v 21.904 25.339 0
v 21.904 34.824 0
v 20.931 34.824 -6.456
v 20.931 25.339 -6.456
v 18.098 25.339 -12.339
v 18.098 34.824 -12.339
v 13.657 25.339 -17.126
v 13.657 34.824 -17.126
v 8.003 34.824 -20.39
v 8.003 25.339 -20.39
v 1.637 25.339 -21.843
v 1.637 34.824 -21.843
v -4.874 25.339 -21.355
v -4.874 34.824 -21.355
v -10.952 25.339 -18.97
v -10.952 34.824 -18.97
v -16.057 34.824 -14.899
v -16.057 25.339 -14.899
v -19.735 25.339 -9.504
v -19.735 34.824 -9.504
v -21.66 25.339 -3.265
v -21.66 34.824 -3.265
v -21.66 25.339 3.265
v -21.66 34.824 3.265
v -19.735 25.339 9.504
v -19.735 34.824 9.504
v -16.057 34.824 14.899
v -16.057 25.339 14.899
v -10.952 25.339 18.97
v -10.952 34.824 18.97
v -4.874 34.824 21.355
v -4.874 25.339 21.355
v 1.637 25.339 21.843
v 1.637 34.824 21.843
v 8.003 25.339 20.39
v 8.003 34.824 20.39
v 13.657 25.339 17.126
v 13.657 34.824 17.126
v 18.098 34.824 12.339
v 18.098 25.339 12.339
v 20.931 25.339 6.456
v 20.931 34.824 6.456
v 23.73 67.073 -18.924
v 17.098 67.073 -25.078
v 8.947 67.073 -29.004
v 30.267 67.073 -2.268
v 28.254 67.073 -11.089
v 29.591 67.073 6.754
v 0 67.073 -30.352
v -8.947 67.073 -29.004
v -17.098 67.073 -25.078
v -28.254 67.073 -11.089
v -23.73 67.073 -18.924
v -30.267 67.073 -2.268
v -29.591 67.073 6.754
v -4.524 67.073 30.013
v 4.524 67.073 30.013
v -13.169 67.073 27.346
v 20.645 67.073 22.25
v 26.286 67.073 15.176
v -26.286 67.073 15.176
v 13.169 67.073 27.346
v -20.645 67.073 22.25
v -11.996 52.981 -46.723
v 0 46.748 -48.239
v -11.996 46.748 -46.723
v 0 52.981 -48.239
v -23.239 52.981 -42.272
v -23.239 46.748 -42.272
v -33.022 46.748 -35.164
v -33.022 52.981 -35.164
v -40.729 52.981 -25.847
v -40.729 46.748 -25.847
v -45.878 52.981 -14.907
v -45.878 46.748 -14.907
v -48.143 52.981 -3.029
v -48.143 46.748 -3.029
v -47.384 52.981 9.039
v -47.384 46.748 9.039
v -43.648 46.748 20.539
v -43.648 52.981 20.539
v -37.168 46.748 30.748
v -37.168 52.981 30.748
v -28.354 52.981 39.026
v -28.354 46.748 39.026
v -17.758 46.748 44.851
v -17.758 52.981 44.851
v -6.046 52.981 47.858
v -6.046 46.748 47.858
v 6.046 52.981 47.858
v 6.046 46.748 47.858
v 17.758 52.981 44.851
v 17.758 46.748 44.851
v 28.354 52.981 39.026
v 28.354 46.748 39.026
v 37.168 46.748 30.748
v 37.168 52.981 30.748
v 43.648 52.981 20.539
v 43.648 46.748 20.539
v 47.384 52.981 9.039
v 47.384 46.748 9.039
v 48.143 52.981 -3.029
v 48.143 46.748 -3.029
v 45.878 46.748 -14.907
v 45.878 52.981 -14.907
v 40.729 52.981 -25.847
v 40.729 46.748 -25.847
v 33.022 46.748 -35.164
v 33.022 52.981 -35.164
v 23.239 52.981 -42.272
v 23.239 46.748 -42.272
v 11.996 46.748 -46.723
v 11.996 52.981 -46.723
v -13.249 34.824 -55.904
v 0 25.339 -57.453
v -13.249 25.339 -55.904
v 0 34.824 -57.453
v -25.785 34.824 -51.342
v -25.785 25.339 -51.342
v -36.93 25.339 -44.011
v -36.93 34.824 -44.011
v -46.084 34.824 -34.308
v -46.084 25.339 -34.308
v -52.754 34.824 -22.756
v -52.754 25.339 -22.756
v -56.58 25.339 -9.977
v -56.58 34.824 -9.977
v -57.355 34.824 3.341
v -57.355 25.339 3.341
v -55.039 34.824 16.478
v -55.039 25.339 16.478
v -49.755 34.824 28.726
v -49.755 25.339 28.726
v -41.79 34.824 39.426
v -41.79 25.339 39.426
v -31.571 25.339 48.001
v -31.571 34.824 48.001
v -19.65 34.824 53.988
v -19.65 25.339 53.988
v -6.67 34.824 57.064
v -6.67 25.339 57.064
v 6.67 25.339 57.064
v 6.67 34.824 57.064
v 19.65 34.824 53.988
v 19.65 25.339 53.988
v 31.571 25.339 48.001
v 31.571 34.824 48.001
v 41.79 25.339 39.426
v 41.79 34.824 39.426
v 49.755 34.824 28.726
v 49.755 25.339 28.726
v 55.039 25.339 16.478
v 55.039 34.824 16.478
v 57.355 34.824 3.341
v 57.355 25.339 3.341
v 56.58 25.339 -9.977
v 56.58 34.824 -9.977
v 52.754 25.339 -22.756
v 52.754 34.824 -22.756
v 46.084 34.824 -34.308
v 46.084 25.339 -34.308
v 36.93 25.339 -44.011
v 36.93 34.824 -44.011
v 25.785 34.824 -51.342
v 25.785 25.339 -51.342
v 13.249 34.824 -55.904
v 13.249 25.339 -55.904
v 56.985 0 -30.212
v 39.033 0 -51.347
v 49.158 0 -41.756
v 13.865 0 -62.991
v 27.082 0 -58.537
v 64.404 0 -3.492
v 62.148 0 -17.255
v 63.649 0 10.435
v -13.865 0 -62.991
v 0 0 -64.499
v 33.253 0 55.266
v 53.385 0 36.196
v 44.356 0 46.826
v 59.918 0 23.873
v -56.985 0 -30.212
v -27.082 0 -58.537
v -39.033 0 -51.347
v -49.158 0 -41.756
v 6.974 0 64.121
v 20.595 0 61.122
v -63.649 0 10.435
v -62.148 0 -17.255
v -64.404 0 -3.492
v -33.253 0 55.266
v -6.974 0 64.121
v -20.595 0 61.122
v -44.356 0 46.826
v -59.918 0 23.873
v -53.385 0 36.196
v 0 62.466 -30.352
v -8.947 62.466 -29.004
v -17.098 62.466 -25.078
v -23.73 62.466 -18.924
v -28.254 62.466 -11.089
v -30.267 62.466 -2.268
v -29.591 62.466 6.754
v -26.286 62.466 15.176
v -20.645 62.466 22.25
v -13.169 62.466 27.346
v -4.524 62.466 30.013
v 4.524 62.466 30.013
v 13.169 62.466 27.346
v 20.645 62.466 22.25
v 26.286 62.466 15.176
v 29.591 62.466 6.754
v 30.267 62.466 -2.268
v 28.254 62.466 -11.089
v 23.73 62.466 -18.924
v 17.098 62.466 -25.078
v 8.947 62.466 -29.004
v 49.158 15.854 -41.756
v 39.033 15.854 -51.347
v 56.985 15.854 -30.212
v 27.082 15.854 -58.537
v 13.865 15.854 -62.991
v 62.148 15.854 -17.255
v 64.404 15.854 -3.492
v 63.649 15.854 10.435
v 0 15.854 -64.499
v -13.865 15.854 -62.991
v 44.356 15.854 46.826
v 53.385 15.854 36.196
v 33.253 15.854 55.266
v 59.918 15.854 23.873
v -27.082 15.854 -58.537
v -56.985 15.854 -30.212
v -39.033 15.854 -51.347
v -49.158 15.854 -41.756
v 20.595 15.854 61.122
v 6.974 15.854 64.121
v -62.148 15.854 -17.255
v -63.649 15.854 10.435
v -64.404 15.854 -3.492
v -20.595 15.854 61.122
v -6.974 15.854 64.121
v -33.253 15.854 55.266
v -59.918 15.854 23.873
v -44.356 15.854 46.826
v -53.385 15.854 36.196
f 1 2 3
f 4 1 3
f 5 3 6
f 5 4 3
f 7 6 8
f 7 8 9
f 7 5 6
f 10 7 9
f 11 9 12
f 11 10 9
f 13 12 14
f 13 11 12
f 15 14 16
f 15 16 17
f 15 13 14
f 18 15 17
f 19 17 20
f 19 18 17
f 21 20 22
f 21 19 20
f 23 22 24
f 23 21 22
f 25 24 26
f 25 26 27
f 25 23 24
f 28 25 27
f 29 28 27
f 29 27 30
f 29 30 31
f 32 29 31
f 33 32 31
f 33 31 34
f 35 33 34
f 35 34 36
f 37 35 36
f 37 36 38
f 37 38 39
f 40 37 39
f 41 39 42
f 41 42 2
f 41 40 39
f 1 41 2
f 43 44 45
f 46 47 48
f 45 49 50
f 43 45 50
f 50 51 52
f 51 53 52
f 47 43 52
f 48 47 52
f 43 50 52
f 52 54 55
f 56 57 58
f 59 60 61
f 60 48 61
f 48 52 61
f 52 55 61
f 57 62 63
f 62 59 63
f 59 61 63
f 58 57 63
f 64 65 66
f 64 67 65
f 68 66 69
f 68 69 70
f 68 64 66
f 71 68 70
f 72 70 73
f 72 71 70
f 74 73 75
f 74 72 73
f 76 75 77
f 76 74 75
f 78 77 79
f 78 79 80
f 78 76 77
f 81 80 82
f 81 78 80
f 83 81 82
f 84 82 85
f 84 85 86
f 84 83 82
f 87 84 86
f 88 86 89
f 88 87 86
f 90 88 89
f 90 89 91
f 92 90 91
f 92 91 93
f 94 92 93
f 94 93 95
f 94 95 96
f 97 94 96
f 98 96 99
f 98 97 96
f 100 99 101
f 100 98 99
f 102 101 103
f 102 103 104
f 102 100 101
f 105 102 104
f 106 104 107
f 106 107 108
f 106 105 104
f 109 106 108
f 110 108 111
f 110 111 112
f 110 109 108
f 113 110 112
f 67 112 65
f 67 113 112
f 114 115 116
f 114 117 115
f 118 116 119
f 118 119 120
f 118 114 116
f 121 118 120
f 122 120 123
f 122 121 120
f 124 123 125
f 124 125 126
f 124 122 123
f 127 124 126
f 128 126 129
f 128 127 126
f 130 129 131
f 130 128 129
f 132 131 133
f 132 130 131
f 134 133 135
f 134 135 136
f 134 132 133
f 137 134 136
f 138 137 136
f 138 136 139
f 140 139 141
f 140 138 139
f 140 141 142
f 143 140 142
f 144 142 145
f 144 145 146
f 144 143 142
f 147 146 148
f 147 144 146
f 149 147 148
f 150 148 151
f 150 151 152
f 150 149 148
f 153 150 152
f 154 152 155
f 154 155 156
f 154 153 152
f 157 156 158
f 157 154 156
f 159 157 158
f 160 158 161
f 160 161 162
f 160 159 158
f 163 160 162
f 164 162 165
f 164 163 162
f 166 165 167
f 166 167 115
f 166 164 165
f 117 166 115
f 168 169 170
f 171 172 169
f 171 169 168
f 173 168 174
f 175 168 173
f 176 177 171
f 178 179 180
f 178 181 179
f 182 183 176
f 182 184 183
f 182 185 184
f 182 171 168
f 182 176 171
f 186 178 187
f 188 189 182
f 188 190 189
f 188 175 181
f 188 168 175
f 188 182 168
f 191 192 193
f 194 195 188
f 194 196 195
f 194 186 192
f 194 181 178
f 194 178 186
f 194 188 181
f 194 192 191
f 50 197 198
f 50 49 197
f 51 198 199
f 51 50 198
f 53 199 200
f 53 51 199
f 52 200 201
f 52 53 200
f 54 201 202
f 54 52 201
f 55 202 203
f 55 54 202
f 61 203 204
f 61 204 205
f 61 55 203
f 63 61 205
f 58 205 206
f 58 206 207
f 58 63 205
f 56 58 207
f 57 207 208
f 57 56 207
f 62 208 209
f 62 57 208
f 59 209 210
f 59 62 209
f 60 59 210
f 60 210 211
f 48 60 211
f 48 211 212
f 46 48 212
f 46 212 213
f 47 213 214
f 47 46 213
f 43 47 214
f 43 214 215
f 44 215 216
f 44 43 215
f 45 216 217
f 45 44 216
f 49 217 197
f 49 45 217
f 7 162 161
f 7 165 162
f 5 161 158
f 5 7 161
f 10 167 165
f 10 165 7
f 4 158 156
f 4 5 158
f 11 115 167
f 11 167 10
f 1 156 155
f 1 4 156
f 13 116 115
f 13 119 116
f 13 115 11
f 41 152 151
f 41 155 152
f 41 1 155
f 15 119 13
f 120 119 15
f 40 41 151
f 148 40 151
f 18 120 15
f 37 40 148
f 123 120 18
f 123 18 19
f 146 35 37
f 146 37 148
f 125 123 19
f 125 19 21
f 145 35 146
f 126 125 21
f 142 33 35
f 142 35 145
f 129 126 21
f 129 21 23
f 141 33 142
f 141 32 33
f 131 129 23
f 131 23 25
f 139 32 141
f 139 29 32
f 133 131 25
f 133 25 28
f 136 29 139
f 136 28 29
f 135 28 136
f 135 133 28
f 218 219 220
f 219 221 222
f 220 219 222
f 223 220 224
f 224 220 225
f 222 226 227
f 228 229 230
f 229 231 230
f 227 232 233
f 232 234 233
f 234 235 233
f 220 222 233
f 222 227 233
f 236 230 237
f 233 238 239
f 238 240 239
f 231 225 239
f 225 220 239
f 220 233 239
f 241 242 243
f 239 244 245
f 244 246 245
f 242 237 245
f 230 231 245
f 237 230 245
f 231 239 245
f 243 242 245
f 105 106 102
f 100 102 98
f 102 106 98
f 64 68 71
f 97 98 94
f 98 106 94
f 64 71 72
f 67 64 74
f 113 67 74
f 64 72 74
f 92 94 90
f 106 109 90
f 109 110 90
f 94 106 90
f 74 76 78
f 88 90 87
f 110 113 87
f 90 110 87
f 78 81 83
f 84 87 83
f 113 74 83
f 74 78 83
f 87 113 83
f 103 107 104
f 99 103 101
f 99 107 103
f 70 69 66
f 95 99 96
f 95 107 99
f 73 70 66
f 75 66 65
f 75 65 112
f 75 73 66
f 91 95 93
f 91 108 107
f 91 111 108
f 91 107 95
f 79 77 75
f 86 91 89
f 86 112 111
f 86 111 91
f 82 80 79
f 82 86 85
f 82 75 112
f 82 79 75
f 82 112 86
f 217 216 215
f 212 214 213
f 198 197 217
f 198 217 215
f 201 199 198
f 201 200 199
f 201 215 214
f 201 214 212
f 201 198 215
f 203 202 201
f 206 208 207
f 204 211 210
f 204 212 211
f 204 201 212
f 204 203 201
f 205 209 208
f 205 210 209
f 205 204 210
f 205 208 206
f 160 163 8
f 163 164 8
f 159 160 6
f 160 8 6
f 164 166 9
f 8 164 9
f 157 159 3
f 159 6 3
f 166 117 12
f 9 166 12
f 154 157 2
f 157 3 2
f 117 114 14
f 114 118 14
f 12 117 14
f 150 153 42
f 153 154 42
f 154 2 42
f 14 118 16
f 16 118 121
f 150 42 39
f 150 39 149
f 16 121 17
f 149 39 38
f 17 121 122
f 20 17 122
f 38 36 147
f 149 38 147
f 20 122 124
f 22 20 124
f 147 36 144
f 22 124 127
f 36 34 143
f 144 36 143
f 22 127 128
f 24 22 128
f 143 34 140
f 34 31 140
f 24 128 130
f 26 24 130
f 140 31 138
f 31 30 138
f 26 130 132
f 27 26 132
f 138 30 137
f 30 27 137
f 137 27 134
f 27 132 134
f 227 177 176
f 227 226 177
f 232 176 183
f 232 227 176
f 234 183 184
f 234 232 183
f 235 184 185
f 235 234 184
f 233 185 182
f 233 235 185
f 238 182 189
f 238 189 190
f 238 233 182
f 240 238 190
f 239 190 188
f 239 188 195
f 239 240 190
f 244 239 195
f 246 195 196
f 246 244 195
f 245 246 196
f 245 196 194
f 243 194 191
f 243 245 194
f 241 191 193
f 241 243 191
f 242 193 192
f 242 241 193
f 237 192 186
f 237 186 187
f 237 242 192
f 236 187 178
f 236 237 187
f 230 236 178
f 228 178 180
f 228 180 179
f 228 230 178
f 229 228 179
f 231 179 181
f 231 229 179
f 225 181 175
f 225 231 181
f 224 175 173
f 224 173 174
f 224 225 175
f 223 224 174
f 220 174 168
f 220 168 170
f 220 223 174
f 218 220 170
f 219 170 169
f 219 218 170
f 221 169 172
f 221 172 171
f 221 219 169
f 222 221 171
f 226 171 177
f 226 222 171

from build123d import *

# Parameters (mm, degrees)
SKETCH1_W              = 64.498680347
SKETCH1_H              = 15.853667228
SKETCH1_W_2            = 57.452606024
SKETCH1_H_2            = 9.485100051
SKETCH1_W_3            = 48.238508831
SKETCH1_H_3            = 6.233065748
SKETCH1_W_4            = 30.352320163
SKETCH1_H_4            = 4.607048596
CUT_EXTRUDE1_START     = -41.734440225
CUT_EXTRUDE1_OUTLINE_R = 21.904394949
CUT_EXTRUDE1_DEPTH     = 9.485100051


# Read off the part's stored shape, not the designer's step: Cut-Extrude1
with BuildPart() as part:
    # Sketch1 → Revolve1 (revolve)
    with BuildSketch(Plane.XY, mode=Mode.PRIVATE) as revolve1_sk:
        with Locations((32.249340174, 7.926833614)):
            Rectangle(SKETCH1_W, SKETCH1_H)
        with Locations((28.726303012, 30.081317305)):
            Rectangle(SKETCH1_W_2, SKETCH1_H_2)
        with Locations((24.119254416, 49.864525983)):
            Rectangle(SKETCH1_W_3, SKETCH1_H_3)
        with Locations((15.176160082, 64.769683206)):
            Rectangle(SKETCH1_W_4, SKETCH1_H_4)
    revolve(revolve1_sk.sketch.rotate(Axis((0, 25.338767279, 0), (0, 1, 0)), 90), axis=Axis((0, 25.338767279, 0), (0, 1, 0)))

    # Cut-Extrude1 outline → Cut-Extrude1 (cut)
    with BuildSketch(Plane(origin=(0, 67.073207504, 0), x_dir=(1, 0, 0), z_dir=(0, 1, 0)).offset(CUT_EXTRUDE1_START)):
        Circle(CUT_EXTRUDE1_OUTLINE_R)
    extrude(amount=CUT_EXTRUDE1_DEPTH, mode=Mode.SUBTRACT)


solid = part.part
